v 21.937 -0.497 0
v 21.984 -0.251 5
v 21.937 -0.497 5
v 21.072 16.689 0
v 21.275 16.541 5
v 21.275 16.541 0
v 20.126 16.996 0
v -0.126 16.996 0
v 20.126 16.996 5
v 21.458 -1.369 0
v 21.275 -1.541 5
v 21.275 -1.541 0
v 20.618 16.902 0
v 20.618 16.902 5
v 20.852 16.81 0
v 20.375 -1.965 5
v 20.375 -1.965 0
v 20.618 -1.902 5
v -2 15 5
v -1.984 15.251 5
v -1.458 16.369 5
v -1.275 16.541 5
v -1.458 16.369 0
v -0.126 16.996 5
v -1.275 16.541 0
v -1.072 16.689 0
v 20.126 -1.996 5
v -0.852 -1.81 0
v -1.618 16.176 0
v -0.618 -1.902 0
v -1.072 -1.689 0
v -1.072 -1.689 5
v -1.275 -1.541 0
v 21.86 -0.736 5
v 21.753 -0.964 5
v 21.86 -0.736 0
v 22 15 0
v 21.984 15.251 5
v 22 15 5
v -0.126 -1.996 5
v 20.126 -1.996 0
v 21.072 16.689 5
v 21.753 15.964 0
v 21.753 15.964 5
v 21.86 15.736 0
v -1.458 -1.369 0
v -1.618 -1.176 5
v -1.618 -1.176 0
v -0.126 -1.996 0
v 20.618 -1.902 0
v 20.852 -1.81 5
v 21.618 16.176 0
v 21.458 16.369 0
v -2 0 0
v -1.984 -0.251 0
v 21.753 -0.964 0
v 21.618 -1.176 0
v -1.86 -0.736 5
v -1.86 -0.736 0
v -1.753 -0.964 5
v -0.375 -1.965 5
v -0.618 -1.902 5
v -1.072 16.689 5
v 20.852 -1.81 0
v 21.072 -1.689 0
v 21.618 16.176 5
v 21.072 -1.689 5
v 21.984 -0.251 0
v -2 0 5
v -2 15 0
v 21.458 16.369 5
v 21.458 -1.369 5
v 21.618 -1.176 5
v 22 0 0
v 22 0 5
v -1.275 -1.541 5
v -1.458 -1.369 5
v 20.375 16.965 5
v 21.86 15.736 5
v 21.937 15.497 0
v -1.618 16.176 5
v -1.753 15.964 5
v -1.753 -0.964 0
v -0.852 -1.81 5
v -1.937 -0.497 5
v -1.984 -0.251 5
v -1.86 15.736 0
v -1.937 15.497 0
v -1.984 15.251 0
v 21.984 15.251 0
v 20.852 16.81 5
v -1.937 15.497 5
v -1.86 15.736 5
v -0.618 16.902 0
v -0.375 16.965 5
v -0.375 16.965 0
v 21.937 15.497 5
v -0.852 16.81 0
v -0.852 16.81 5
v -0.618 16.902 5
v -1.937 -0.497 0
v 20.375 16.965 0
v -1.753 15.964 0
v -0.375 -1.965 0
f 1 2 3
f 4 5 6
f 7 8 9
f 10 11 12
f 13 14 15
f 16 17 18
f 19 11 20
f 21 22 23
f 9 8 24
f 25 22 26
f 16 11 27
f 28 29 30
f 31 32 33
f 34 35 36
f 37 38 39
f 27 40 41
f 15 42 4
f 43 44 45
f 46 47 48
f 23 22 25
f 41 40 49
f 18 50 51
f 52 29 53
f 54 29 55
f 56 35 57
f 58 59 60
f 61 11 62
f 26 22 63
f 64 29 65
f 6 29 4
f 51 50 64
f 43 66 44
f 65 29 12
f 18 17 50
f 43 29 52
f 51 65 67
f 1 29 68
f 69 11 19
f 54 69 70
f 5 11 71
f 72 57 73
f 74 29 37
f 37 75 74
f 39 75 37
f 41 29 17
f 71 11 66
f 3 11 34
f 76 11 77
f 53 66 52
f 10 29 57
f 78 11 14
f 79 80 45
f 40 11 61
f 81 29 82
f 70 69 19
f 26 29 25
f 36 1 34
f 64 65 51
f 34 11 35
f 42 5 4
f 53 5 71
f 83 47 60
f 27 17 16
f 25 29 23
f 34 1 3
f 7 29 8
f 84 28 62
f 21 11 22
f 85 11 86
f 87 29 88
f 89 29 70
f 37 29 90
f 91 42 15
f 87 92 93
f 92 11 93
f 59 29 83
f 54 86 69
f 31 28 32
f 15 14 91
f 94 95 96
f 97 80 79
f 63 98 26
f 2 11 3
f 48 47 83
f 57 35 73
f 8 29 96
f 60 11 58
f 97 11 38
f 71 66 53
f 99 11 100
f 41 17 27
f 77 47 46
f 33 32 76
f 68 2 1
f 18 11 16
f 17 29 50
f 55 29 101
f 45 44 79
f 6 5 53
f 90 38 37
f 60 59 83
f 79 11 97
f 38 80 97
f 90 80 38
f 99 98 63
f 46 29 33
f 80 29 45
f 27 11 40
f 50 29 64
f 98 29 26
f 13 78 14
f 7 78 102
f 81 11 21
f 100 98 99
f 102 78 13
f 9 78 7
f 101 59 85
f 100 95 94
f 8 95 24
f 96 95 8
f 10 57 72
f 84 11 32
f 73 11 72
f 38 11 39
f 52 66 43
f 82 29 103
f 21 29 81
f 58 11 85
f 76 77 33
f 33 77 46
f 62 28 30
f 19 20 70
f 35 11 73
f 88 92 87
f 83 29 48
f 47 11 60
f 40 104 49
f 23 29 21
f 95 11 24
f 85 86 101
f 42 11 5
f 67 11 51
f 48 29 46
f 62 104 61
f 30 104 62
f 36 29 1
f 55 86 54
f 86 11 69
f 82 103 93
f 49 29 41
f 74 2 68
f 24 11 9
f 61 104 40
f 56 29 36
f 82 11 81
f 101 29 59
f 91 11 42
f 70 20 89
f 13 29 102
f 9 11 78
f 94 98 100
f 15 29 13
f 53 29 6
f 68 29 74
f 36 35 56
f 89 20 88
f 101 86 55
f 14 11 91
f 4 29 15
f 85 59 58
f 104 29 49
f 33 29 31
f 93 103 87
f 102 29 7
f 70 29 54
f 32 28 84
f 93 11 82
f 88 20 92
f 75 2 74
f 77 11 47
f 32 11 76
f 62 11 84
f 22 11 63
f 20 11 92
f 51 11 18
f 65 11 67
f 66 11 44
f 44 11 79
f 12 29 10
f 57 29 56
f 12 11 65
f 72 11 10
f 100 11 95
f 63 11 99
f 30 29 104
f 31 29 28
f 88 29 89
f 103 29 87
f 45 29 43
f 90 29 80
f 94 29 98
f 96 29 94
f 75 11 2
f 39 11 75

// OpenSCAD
$fn=50;
minkowski() {
cube([20,15,3]);
// rounded corners
cylinder(r=2,h=2);
}
